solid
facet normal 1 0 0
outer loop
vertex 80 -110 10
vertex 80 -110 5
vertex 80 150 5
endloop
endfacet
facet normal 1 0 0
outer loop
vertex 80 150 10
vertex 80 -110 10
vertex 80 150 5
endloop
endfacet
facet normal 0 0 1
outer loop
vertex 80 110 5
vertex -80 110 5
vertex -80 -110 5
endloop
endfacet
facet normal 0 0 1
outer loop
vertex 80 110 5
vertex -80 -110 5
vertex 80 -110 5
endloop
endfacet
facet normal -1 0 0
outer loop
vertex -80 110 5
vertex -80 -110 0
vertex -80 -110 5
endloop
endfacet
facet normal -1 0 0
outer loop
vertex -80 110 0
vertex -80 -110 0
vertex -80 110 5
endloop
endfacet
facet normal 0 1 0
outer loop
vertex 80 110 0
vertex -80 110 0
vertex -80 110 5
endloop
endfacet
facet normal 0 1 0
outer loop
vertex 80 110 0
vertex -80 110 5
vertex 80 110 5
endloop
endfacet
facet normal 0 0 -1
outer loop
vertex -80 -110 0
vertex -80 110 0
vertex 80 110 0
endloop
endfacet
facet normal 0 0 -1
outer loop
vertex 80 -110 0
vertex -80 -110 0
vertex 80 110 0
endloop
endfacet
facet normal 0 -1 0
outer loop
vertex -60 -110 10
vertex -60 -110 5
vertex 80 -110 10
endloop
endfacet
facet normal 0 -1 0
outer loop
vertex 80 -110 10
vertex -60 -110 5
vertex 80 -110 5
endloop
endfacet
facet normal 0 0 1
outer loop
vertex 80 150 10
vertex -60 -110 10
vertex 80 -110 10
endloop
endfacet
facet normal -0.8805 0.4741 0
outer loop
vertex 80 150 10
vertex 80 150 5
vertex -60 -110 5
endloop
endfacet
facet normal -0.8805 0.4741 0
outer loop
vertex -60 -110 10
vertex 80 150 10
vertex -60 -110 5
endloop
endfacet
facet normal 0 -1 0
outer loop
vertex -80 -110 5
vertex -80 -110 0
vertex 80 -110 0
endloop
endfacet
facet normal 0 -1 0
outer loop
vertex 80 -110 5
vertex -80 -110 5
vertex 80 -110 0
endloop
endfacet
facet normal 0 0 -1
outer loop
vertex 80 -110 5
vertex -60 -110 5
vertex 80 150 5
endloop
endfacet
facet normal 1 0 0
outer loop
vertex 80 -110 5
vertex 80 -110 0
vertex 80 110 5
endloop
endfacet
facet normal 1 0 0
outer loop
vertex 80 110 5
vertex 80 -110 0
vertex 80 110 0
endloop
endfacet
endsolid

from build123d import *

# Parameters (mm, degrees)
F0_W     = 160
F0_H     = 220
F1_DEPTH = 5
F3_DEPTH = 5


with BuildPart() as f1:
    # F0 (on Top) → F1 (new body)
    with BuildSketch(Plane.XY):
        Rectangle(F0_W, F0_H)
    extrude(amount=F1_DEPTH)


with BuildPart() as f3:
    # F2 (on face) → F3 (new body)
    with BuildSketch(Plane.XY.offset(5)):
        Polygon((-60, -110), (80, -110), (80, 150), align=None)
    extrude(amount=F3_DEPTH)


solid = Compound([f1.part, f3.part])
